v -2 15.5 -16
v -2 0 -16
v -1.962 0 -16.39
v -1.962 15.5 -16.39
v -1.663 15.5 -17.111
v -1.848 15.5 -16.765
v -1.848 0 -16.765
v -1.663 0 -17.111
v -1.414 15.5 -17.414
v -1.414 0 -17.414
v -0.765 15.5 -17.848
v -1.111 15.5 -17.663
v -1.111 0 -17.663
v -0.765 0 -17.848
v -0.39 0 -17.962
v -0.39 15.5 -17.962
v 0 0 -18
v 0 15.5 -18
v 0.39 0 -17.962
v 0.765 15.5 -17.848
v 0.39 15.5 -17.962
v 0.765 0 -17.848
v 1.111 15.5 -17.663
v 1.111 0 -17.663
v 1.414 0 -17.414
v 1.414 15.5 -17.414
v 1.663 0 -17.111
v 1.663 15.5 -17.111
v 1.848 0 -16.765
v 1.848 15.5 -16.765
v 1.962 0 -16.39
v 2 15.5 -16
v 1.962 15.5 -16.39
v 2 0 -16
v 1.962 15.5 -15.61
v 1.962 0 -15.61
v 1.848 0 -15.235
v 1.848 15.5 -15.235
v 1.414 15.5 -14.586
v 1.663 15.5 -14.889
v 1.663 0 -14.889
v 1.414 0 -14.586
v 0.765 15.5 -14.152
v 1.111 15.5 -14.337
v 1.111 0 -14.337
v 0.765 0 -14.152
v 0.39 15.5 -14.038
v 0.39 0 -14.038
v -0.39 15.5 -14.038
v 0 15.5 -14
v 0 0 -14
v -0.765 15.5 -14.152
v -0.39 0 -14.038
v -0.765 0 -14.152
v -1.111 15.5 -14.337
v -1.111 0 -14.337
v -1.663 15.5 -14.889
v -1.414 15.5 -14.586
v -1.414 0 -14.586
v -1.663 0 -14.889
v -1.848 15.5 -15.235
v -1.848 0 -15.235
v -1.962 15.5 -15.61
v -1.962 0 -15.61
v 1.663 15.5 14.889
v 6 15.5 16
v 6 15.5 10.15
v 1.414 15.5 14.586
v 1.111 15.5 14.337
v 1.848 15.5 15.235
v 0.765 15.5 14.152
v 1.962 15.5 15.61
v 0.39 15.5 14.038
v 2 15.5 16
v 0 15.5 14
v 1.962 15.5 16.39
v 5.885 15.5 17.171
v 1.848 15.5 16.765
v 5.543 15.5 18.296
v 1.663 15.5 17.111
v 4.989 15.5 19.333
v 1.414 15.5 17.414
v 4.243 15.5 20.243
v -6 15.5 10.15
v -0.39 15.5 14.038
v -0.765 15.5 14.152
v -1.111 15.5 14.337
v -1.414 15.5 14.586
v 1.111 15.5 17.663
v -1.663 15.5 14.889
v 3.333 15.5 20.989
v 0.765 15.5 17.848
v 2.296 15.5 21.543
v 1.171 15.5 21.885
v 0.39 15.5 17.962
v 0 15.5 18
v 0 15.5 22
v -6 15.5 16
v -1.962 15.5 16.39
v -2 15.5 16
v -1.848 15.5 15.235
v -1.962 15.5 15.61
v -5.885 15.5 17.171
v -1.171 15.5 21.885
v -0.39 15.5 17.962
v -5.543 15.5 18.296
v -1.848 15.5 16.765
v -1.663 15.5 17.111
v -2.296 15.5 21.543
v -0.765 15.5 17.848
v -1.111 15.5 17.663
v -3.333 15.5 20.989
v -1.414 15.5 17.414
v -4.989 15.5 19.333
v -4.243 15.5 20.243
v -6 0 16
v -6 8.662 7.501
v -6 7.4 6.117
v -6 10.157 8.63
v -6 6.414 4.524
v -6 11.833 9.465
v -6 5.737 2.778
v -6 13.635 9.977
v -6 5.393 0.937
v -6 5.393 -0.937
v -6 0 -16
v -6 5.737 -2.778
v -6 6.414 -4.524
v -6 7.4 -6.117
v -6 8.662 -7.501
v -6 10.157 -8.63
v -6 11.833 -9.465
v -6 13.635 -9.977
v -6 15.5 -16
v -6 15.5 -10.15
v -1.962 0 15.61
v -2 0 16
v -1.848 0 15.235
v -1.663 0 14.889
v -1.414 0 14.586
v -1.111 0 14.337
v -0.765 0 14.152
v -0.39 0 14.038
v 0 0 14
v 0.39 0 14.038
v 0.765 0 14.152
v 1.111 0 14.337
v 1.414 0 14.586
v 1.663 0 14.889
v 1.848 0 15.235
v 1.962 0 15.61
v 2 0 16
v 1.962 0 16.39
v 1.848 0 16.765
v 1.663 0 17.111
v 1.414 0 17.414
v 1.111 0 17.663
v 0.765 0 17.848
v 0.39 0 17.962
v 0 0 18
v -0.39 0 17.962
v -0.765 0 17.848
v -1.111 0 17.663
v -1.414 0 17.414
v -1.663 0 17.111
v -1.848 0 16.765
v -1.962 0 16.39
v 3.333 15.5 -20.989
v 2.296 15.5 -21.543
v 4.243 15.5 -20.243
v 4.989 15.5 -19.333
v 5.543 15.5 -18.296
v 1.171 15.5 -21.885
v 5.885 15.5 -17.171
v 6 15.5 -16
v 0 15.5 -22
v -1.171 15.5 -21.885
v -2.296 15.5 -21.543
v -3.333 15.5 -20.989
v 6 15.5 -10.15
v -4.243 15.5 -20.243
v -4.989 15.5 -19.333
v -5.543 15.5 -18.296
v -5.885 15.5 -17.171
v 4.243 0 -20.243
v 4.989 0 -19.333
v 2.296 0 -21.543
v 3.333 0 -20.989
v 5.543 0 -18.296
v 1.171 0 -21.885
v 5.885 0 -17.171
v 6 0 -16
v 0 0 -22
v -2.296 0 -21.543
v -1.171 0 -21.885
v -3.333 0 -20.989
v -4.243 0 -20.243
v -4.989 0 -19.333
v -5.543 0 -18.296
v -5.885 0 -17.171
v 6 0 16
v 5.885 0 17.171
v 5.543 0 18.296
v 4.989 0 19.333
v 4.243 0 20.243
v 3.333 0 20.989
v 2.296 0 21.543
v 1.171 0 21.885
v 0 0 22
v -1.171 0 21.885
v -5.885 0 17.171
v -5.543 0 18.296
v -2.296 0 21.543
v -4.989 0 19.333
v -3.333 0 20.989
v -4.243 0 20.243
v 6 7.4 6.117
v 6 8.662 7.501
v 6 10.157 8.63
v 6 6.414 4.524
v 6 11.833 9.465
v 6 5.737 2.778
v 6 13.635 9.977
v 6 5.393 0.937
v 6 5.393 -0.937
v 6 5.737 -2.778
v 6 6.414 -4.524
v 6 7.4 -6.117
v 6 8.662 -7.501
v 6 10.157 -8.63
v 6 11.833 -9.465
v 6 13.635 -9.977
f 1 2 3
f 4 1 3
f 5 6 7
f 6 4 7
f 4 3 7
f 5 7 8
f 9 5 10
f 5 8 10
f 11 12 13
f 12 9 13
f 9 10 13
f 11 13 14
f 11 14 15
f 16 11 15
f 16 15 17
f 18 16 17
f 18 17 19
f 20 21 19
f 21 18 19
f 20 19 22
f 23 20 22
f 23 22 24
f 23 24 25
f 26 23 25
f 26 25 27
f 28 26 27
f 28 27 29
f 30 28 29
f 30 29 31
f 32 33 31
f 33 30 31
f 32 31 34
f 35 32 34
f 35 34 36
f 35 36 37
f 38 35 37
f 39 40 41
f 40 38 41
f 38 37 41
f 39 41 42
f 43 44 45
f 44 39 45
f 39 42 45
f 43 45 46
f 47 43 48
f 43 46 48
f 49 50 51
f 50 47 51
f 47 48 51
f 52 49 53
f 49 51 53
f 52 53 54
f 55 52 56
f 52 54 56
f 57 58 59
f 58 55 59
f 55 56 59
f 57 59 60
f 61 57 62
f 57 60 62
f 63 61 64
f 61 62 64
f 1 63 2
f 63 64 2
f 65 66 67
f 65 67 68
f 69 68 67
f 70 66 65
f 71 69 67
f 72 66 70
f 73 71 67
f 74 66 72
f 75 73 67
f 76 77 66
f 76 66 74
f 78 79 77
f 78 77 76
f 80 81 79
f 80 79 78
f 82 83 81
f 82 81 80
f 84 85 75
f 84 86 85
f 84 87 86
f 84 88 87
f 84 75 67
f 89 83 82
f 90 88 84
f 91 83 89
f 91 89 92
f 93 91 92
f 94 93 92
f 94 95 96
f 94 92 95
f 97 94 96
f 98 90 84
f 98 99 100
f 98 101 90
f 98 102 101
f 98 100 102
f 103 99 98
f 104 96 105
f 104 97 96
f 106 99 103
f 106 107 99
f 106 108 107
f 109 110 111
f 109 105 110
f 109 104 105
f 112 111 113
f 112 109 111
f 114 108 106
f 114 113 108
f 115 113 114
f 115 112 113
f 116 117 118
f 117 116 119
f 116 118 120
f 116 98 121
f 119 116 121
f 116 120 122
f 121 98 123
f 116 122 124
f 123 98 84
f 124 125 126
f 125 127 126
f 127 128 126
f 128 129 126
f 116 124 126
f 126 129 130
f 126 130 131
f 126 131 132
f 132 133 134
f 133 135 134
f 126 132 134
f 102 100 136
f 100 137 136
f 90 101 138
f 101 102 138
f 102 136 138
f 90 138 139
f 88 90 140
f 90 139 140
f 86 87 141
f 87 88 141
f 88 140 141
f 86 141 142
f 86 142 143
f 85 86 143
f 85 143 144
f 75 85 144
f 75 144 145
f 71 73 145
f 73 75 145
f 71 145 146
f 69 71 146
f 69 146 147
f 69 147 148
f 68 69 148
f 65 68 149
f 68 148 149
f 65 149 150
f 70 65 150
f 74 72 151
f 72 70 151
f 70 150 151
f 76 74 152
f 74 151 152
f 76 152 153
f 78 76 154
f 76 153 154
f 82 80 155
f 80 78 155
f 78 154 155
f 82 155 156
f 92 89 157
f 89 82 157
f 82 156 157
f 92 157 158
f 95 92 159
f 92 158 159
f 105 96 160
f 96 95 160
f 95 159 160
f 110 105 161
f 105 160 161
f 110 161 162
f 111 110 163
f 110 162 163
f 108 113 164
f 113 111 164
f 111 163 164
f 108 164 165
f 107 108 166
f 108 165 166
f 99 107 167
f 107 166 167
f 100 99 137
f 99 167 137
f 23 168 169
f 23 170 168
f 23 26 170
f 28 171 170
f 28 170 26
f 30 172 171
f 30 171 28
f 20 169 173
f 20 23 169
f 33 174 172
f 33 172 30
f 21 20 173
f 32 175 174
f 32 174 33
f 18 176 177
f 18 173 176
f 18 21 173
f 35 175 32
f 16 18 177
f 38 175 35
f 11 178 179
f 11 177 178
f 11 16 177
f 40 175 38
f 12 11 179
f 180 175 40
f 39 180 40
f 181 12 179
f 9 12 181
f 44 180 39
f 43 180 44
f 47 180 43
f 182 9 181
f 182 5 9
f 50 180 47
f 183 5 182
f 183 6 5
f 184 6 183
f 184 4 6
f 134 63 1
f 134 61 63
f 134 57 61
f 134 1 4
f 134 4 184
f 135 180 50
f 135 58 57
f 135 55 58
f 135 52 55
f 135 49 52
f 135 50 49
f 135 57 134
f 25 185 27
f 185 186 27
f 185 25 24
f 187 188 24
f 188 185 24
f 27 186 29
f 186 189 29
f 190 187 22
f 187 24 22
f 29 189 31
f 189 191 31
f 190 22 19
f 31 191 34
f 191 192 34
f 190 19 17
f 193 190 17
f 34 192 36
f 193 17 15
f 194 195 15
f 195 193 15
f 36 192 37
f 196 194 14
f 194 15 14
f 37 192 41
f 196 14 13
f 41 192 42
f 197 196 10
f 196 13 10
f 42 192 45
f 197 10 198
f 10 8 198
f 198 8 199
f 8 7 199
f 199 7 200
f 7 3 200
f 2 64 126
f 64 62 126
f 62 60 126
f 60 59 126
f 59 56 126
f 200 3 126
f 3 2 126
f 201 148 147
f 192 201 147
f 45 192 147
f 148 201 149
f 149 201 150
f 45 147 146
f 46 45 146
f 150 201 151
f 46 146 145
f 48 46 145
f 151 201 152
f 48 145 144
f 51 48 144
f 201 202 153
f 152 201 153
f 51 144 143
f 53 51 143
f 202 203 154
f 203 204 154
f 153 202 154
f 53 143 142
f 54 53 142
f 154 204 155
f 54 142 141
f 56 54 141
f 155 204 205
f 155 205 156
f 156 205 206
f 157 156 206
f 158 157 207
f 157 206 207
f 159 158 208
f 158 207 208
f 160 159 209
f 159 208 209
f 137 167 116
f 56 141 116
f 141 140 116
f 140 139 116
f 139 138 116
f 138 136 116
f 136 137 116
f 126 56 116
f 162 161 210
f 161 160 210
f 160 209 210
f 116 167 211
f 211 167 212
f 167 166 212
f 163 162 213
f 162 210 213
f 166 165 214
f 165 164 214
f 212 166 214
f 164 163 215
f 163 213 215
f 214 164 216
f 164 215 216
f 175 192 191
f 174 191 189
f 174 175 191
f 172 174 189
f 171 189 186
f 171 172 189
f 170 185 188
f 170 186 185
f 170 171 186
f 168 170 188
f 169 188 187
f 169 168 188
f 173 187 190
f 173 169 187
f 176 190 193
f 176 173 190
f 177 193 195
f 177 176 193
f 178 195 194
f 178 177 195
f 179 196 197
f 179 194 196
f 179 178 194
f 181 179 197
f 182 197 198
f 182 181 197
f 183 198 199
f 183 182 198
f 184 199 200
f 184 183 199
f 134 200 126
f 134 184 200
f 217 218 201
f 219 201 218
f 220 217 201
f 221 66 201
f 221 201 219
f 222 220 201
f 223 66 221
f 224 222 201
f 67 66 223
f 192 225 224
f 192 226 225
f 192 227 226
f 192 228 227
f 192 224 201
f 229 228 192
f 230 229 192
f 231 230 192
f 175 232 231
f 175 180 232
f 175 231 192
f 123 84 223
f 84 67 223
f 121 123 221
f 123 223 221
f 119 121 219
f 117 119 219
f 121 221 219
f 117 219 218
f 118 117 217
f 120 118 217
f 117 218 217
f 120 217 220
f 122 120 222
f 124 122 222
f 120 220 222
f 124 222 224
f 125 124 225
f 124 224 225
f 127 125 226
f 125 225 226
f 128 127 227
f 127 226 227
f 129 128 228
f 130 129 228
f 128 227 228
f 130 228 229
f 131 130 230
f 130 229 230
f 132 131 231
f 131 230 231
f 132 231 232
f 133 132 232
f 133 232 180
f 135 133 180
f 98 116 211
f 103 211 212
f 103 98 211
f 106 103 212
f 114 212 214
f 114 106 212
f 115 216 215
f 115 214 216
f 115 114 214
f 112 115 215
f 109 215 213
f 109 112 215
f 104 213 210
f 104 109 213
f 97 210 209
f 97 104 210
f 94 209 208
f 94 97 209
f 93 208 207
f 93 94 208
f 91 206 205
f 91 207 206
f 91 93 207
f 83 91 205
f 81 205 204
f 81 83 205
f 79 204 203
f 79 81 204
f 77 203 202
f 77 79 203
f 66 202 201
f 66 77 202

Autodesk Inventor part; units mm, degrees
ref_plane "YZ Plane" through (0, 0, 0) normal (1, 0, 0) x (0, 1, 0)
ref_plane "XZ Plane" through (0, 0, 0) normal (0, 1, 0) x (-1, 0, 0)
ref_plane "XY Plane" through (0, 0, 0) normal (0, 0, 1) x (1, 0, 0)
sketch "Эскиз1" plane through (0, 0, 0) normal (0, 1, 0) x (-1, 0, 0)
  line L0 (7.5, 22) -> (-7.5, 22)
  line L1 (-7.5, 22) -> (-7.5, -22)
  line L2 (-7.5, -22) -> (7.5, -22)
  line L3 (7.5, -22) -> (7.5, 22)
  line L4 (-7.5, 22) -> (7.5, -22) construction
  line L5 (0, 22) -> (0, -22) construction
  circle A0 centre (0, 16) radius 2
  line L6 (7.5, 0) -> (-7.5, 0) construction
  circle A1 centre (0, -16) radius 2
  point P0 (0, 0)
  point P1 (0, 0)
  dimension "d0" = 15
  dimension "d1" = 44
  dimension "d2" = 16
  dimension "d3" = 4
extrude "Выдавливание1" add sketch "Эскиз1" along normal blind 15.5
sketch "Эскиз2" plane through (7.5, 0, 22) normal (1, 0, 0) x (0, 0, -1)
  line L0 (0, 15.5) -> (44, 15.5) projected
  circle A0 centre (22, 15.5) radius 10.15
  point P0 (22, 0)
  dimension "Диаметр_мотора" = 20.3
extrude "Выдавливание2" cut sketch "Эскиз2" against normal through all
sketch "Эскиз4" plane through (0, 15.5, 0) normal (0, 1, 0) x (1, 0, 0)
  circle A0 centre (0, 16) radius 3.5
  circle A1 centre (0, 16) radius 2 projected
  line L0 (-6, 12.5) -> (6, 12.5)
  line L1 (6, 16) -> (6, 0)
  line L2 (6, 0) -> (-6, 0)
  line L3 (-6, 0) -> (-6, 16)
  line L4 (-6, 12.5) -> (6, 0) construction
  line L5 (0, 0) -> (0, 16) construction
  arc A2 (6, 16) -> (-6, 16) centre (0, 16) ccw
  line L6 (7.5, 22) -> (-7.5, 22) projected
  line L7 (6, -16) -> (6, 0)
  line L8 (-6, 0) -> (-6, -16)
  arc A3 (-6, -16) -> (6, -16) centre (0, -16) ccw
  line L9 (7.5, 22) -> (-7.5, 22) projected
  line L10 (7.5, -22) -> (7.5, 22) projected
  line L11 (-7.5, 22) -> (7.5, 22)
  line L12 (7.5, 22) -> (7.5, -22)
  line L13 (7.5, -22) -> (-7.5, -22)
  line L14 (-7.5, -22) -> (-7.5, 22)
  point P0 (0, 6.25)
  point P1 (0, 12.5)
  point P2 (0, 22)
  point P3 (0, -22)
  dimension "d12" = 7
extrude "Выдавливание3" cut sketch "Эскиз4" against normal through all contours L3 L8 A3 L13 L14 L6 A2 | L1 A2 L6 L10 L13 A3 L7
properties part number "motor_mount_edge_part2"
